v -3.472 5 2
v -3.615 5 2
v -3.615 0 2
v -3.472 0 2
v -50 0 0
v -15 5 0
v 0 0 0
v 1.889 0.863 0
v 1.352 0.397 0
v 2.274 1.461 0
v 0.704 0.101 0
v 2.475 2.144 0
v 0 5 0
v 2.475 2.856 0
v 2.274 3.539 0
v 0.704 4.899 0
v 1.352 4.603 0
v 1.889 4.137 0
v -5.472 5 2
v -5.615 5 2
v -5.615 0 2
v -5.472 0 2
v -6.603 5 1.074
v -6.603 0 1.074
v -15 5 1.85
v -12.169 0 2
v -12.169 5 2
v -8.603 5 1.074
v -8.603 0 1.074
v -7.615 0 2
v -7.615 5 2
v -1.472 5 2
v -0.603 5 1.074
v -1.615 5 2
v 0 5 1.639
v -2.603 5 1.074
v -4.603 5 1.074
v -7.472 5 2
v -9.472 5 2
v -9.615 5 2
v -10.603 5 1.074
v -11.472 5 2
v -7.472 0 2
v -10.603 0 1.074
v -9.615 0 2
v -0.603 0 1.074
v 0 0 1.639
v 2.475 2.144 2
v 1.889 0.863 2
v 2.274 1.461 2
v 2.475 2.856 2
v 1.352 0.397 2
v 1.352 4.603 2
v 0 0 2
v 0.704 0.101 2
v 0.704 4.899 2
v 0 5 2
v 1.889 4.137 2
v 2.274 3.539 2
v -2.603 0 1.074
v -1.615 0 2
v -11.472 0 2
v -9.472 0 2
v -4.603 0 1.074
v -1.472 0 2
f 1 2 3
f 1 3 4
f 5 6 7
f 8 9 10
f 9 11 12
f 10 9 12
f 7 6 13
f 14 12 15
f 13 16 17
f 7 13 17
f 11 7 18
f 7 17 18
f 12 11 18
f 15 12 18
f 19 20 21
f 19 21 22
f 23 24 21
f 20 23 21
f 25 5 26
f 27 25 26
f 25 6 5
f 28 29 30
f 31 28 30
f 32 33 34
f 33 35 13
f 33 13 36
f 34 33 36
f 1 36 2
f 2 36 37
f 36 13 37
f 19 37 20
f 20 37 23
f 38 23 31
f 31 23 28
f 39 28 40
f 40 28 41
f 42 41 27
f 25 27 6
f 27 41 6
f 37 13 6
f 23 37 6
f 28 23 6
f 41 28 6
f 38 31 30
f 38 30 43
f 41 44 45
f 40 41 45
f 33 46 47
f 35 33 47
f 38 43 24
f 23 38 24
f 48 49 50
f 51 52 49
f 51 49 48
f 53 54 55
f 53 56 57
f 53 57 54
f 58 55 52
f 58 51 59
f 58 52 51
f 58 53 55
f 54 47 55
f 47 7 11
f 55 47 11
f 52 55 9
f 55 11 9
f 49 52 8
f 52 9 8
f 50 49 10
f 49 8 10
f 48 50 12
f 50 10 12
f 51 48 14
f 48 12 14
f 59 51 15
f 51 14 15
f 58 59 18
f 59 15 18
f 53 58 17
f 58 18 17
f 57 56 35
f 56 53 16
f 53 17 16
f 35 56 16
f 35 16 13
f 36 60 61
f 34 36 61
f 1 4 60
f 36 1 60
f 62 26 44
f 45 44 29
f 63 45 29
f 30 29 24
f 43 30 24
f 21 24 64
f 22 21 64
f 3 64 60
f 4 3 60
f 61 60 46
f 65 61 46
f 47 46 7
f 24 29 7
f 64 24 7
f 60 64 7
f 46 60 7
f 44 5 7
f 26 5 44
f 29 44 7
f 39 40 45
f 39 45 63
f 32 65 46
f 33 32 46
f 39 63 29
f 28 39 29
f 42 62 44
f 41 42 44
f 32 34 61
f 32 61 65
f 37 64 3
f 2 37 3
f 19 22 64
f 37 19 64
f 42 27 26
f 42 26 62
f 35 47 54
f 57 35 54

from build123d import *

# Parameters (mm, degrees)
F1_DEPTH = 2
F3_DEPTH = 5
F5_DEPTH = 5


with BuildPart() as f1:
    # F0 (on Top) → F1 (new body)
    with BuildSketch(Plane.XY):
        with BuildLine():
            Line((-15, 5), (-50, 0))
            Line((-50, 0), (0, 0))
            ThreePointArc((0, 0), (2.5, 2.5), (0, 5))
            Line((0, 5), (-15, 5))
        make_face()
    extrude(amount=F1_DEPTH)

    # F2 (on face) → F3 (cut)
    with BuildSketch(Plane.XZ):
        Polygon((-50, 2), (-50, 0), (-12.168623, 2), align=None)
    extrude(amount=-F3_DEPTH, mode=Mode.SUBTRACT)

    # F4 (on face) → F5 (cut)
    with BuildSketch(Plane.XZ):
        Polygon((-9.615218, 2), (-11.471676, 2), (-10.602703, 1.073664), align=None)
        Polygon((-7.615218, 2), (-9.471676, 2), (-8.602703, 1.073664), align=None)
        Polygon((-5.615218, 2), (-7.471676, 2), (-6.602703, 1.073664), align=None)
        Polygon((-3.615218, 2), (-5.471676, 2), (-4.602703, 1.073664), align=None)
        Polygon((-2.602703, 1.073664), (-1.615218, 2), (-3.471676, 2), align=None)
        Polygon((-0.602703, 1.073664), (0, 1.639045), (0, 2), (-1.471676, 2), align=None)
    extrude(amount=-F5_DEPTH, mode=Mode.SUBTRACT)


solid = f1.part
